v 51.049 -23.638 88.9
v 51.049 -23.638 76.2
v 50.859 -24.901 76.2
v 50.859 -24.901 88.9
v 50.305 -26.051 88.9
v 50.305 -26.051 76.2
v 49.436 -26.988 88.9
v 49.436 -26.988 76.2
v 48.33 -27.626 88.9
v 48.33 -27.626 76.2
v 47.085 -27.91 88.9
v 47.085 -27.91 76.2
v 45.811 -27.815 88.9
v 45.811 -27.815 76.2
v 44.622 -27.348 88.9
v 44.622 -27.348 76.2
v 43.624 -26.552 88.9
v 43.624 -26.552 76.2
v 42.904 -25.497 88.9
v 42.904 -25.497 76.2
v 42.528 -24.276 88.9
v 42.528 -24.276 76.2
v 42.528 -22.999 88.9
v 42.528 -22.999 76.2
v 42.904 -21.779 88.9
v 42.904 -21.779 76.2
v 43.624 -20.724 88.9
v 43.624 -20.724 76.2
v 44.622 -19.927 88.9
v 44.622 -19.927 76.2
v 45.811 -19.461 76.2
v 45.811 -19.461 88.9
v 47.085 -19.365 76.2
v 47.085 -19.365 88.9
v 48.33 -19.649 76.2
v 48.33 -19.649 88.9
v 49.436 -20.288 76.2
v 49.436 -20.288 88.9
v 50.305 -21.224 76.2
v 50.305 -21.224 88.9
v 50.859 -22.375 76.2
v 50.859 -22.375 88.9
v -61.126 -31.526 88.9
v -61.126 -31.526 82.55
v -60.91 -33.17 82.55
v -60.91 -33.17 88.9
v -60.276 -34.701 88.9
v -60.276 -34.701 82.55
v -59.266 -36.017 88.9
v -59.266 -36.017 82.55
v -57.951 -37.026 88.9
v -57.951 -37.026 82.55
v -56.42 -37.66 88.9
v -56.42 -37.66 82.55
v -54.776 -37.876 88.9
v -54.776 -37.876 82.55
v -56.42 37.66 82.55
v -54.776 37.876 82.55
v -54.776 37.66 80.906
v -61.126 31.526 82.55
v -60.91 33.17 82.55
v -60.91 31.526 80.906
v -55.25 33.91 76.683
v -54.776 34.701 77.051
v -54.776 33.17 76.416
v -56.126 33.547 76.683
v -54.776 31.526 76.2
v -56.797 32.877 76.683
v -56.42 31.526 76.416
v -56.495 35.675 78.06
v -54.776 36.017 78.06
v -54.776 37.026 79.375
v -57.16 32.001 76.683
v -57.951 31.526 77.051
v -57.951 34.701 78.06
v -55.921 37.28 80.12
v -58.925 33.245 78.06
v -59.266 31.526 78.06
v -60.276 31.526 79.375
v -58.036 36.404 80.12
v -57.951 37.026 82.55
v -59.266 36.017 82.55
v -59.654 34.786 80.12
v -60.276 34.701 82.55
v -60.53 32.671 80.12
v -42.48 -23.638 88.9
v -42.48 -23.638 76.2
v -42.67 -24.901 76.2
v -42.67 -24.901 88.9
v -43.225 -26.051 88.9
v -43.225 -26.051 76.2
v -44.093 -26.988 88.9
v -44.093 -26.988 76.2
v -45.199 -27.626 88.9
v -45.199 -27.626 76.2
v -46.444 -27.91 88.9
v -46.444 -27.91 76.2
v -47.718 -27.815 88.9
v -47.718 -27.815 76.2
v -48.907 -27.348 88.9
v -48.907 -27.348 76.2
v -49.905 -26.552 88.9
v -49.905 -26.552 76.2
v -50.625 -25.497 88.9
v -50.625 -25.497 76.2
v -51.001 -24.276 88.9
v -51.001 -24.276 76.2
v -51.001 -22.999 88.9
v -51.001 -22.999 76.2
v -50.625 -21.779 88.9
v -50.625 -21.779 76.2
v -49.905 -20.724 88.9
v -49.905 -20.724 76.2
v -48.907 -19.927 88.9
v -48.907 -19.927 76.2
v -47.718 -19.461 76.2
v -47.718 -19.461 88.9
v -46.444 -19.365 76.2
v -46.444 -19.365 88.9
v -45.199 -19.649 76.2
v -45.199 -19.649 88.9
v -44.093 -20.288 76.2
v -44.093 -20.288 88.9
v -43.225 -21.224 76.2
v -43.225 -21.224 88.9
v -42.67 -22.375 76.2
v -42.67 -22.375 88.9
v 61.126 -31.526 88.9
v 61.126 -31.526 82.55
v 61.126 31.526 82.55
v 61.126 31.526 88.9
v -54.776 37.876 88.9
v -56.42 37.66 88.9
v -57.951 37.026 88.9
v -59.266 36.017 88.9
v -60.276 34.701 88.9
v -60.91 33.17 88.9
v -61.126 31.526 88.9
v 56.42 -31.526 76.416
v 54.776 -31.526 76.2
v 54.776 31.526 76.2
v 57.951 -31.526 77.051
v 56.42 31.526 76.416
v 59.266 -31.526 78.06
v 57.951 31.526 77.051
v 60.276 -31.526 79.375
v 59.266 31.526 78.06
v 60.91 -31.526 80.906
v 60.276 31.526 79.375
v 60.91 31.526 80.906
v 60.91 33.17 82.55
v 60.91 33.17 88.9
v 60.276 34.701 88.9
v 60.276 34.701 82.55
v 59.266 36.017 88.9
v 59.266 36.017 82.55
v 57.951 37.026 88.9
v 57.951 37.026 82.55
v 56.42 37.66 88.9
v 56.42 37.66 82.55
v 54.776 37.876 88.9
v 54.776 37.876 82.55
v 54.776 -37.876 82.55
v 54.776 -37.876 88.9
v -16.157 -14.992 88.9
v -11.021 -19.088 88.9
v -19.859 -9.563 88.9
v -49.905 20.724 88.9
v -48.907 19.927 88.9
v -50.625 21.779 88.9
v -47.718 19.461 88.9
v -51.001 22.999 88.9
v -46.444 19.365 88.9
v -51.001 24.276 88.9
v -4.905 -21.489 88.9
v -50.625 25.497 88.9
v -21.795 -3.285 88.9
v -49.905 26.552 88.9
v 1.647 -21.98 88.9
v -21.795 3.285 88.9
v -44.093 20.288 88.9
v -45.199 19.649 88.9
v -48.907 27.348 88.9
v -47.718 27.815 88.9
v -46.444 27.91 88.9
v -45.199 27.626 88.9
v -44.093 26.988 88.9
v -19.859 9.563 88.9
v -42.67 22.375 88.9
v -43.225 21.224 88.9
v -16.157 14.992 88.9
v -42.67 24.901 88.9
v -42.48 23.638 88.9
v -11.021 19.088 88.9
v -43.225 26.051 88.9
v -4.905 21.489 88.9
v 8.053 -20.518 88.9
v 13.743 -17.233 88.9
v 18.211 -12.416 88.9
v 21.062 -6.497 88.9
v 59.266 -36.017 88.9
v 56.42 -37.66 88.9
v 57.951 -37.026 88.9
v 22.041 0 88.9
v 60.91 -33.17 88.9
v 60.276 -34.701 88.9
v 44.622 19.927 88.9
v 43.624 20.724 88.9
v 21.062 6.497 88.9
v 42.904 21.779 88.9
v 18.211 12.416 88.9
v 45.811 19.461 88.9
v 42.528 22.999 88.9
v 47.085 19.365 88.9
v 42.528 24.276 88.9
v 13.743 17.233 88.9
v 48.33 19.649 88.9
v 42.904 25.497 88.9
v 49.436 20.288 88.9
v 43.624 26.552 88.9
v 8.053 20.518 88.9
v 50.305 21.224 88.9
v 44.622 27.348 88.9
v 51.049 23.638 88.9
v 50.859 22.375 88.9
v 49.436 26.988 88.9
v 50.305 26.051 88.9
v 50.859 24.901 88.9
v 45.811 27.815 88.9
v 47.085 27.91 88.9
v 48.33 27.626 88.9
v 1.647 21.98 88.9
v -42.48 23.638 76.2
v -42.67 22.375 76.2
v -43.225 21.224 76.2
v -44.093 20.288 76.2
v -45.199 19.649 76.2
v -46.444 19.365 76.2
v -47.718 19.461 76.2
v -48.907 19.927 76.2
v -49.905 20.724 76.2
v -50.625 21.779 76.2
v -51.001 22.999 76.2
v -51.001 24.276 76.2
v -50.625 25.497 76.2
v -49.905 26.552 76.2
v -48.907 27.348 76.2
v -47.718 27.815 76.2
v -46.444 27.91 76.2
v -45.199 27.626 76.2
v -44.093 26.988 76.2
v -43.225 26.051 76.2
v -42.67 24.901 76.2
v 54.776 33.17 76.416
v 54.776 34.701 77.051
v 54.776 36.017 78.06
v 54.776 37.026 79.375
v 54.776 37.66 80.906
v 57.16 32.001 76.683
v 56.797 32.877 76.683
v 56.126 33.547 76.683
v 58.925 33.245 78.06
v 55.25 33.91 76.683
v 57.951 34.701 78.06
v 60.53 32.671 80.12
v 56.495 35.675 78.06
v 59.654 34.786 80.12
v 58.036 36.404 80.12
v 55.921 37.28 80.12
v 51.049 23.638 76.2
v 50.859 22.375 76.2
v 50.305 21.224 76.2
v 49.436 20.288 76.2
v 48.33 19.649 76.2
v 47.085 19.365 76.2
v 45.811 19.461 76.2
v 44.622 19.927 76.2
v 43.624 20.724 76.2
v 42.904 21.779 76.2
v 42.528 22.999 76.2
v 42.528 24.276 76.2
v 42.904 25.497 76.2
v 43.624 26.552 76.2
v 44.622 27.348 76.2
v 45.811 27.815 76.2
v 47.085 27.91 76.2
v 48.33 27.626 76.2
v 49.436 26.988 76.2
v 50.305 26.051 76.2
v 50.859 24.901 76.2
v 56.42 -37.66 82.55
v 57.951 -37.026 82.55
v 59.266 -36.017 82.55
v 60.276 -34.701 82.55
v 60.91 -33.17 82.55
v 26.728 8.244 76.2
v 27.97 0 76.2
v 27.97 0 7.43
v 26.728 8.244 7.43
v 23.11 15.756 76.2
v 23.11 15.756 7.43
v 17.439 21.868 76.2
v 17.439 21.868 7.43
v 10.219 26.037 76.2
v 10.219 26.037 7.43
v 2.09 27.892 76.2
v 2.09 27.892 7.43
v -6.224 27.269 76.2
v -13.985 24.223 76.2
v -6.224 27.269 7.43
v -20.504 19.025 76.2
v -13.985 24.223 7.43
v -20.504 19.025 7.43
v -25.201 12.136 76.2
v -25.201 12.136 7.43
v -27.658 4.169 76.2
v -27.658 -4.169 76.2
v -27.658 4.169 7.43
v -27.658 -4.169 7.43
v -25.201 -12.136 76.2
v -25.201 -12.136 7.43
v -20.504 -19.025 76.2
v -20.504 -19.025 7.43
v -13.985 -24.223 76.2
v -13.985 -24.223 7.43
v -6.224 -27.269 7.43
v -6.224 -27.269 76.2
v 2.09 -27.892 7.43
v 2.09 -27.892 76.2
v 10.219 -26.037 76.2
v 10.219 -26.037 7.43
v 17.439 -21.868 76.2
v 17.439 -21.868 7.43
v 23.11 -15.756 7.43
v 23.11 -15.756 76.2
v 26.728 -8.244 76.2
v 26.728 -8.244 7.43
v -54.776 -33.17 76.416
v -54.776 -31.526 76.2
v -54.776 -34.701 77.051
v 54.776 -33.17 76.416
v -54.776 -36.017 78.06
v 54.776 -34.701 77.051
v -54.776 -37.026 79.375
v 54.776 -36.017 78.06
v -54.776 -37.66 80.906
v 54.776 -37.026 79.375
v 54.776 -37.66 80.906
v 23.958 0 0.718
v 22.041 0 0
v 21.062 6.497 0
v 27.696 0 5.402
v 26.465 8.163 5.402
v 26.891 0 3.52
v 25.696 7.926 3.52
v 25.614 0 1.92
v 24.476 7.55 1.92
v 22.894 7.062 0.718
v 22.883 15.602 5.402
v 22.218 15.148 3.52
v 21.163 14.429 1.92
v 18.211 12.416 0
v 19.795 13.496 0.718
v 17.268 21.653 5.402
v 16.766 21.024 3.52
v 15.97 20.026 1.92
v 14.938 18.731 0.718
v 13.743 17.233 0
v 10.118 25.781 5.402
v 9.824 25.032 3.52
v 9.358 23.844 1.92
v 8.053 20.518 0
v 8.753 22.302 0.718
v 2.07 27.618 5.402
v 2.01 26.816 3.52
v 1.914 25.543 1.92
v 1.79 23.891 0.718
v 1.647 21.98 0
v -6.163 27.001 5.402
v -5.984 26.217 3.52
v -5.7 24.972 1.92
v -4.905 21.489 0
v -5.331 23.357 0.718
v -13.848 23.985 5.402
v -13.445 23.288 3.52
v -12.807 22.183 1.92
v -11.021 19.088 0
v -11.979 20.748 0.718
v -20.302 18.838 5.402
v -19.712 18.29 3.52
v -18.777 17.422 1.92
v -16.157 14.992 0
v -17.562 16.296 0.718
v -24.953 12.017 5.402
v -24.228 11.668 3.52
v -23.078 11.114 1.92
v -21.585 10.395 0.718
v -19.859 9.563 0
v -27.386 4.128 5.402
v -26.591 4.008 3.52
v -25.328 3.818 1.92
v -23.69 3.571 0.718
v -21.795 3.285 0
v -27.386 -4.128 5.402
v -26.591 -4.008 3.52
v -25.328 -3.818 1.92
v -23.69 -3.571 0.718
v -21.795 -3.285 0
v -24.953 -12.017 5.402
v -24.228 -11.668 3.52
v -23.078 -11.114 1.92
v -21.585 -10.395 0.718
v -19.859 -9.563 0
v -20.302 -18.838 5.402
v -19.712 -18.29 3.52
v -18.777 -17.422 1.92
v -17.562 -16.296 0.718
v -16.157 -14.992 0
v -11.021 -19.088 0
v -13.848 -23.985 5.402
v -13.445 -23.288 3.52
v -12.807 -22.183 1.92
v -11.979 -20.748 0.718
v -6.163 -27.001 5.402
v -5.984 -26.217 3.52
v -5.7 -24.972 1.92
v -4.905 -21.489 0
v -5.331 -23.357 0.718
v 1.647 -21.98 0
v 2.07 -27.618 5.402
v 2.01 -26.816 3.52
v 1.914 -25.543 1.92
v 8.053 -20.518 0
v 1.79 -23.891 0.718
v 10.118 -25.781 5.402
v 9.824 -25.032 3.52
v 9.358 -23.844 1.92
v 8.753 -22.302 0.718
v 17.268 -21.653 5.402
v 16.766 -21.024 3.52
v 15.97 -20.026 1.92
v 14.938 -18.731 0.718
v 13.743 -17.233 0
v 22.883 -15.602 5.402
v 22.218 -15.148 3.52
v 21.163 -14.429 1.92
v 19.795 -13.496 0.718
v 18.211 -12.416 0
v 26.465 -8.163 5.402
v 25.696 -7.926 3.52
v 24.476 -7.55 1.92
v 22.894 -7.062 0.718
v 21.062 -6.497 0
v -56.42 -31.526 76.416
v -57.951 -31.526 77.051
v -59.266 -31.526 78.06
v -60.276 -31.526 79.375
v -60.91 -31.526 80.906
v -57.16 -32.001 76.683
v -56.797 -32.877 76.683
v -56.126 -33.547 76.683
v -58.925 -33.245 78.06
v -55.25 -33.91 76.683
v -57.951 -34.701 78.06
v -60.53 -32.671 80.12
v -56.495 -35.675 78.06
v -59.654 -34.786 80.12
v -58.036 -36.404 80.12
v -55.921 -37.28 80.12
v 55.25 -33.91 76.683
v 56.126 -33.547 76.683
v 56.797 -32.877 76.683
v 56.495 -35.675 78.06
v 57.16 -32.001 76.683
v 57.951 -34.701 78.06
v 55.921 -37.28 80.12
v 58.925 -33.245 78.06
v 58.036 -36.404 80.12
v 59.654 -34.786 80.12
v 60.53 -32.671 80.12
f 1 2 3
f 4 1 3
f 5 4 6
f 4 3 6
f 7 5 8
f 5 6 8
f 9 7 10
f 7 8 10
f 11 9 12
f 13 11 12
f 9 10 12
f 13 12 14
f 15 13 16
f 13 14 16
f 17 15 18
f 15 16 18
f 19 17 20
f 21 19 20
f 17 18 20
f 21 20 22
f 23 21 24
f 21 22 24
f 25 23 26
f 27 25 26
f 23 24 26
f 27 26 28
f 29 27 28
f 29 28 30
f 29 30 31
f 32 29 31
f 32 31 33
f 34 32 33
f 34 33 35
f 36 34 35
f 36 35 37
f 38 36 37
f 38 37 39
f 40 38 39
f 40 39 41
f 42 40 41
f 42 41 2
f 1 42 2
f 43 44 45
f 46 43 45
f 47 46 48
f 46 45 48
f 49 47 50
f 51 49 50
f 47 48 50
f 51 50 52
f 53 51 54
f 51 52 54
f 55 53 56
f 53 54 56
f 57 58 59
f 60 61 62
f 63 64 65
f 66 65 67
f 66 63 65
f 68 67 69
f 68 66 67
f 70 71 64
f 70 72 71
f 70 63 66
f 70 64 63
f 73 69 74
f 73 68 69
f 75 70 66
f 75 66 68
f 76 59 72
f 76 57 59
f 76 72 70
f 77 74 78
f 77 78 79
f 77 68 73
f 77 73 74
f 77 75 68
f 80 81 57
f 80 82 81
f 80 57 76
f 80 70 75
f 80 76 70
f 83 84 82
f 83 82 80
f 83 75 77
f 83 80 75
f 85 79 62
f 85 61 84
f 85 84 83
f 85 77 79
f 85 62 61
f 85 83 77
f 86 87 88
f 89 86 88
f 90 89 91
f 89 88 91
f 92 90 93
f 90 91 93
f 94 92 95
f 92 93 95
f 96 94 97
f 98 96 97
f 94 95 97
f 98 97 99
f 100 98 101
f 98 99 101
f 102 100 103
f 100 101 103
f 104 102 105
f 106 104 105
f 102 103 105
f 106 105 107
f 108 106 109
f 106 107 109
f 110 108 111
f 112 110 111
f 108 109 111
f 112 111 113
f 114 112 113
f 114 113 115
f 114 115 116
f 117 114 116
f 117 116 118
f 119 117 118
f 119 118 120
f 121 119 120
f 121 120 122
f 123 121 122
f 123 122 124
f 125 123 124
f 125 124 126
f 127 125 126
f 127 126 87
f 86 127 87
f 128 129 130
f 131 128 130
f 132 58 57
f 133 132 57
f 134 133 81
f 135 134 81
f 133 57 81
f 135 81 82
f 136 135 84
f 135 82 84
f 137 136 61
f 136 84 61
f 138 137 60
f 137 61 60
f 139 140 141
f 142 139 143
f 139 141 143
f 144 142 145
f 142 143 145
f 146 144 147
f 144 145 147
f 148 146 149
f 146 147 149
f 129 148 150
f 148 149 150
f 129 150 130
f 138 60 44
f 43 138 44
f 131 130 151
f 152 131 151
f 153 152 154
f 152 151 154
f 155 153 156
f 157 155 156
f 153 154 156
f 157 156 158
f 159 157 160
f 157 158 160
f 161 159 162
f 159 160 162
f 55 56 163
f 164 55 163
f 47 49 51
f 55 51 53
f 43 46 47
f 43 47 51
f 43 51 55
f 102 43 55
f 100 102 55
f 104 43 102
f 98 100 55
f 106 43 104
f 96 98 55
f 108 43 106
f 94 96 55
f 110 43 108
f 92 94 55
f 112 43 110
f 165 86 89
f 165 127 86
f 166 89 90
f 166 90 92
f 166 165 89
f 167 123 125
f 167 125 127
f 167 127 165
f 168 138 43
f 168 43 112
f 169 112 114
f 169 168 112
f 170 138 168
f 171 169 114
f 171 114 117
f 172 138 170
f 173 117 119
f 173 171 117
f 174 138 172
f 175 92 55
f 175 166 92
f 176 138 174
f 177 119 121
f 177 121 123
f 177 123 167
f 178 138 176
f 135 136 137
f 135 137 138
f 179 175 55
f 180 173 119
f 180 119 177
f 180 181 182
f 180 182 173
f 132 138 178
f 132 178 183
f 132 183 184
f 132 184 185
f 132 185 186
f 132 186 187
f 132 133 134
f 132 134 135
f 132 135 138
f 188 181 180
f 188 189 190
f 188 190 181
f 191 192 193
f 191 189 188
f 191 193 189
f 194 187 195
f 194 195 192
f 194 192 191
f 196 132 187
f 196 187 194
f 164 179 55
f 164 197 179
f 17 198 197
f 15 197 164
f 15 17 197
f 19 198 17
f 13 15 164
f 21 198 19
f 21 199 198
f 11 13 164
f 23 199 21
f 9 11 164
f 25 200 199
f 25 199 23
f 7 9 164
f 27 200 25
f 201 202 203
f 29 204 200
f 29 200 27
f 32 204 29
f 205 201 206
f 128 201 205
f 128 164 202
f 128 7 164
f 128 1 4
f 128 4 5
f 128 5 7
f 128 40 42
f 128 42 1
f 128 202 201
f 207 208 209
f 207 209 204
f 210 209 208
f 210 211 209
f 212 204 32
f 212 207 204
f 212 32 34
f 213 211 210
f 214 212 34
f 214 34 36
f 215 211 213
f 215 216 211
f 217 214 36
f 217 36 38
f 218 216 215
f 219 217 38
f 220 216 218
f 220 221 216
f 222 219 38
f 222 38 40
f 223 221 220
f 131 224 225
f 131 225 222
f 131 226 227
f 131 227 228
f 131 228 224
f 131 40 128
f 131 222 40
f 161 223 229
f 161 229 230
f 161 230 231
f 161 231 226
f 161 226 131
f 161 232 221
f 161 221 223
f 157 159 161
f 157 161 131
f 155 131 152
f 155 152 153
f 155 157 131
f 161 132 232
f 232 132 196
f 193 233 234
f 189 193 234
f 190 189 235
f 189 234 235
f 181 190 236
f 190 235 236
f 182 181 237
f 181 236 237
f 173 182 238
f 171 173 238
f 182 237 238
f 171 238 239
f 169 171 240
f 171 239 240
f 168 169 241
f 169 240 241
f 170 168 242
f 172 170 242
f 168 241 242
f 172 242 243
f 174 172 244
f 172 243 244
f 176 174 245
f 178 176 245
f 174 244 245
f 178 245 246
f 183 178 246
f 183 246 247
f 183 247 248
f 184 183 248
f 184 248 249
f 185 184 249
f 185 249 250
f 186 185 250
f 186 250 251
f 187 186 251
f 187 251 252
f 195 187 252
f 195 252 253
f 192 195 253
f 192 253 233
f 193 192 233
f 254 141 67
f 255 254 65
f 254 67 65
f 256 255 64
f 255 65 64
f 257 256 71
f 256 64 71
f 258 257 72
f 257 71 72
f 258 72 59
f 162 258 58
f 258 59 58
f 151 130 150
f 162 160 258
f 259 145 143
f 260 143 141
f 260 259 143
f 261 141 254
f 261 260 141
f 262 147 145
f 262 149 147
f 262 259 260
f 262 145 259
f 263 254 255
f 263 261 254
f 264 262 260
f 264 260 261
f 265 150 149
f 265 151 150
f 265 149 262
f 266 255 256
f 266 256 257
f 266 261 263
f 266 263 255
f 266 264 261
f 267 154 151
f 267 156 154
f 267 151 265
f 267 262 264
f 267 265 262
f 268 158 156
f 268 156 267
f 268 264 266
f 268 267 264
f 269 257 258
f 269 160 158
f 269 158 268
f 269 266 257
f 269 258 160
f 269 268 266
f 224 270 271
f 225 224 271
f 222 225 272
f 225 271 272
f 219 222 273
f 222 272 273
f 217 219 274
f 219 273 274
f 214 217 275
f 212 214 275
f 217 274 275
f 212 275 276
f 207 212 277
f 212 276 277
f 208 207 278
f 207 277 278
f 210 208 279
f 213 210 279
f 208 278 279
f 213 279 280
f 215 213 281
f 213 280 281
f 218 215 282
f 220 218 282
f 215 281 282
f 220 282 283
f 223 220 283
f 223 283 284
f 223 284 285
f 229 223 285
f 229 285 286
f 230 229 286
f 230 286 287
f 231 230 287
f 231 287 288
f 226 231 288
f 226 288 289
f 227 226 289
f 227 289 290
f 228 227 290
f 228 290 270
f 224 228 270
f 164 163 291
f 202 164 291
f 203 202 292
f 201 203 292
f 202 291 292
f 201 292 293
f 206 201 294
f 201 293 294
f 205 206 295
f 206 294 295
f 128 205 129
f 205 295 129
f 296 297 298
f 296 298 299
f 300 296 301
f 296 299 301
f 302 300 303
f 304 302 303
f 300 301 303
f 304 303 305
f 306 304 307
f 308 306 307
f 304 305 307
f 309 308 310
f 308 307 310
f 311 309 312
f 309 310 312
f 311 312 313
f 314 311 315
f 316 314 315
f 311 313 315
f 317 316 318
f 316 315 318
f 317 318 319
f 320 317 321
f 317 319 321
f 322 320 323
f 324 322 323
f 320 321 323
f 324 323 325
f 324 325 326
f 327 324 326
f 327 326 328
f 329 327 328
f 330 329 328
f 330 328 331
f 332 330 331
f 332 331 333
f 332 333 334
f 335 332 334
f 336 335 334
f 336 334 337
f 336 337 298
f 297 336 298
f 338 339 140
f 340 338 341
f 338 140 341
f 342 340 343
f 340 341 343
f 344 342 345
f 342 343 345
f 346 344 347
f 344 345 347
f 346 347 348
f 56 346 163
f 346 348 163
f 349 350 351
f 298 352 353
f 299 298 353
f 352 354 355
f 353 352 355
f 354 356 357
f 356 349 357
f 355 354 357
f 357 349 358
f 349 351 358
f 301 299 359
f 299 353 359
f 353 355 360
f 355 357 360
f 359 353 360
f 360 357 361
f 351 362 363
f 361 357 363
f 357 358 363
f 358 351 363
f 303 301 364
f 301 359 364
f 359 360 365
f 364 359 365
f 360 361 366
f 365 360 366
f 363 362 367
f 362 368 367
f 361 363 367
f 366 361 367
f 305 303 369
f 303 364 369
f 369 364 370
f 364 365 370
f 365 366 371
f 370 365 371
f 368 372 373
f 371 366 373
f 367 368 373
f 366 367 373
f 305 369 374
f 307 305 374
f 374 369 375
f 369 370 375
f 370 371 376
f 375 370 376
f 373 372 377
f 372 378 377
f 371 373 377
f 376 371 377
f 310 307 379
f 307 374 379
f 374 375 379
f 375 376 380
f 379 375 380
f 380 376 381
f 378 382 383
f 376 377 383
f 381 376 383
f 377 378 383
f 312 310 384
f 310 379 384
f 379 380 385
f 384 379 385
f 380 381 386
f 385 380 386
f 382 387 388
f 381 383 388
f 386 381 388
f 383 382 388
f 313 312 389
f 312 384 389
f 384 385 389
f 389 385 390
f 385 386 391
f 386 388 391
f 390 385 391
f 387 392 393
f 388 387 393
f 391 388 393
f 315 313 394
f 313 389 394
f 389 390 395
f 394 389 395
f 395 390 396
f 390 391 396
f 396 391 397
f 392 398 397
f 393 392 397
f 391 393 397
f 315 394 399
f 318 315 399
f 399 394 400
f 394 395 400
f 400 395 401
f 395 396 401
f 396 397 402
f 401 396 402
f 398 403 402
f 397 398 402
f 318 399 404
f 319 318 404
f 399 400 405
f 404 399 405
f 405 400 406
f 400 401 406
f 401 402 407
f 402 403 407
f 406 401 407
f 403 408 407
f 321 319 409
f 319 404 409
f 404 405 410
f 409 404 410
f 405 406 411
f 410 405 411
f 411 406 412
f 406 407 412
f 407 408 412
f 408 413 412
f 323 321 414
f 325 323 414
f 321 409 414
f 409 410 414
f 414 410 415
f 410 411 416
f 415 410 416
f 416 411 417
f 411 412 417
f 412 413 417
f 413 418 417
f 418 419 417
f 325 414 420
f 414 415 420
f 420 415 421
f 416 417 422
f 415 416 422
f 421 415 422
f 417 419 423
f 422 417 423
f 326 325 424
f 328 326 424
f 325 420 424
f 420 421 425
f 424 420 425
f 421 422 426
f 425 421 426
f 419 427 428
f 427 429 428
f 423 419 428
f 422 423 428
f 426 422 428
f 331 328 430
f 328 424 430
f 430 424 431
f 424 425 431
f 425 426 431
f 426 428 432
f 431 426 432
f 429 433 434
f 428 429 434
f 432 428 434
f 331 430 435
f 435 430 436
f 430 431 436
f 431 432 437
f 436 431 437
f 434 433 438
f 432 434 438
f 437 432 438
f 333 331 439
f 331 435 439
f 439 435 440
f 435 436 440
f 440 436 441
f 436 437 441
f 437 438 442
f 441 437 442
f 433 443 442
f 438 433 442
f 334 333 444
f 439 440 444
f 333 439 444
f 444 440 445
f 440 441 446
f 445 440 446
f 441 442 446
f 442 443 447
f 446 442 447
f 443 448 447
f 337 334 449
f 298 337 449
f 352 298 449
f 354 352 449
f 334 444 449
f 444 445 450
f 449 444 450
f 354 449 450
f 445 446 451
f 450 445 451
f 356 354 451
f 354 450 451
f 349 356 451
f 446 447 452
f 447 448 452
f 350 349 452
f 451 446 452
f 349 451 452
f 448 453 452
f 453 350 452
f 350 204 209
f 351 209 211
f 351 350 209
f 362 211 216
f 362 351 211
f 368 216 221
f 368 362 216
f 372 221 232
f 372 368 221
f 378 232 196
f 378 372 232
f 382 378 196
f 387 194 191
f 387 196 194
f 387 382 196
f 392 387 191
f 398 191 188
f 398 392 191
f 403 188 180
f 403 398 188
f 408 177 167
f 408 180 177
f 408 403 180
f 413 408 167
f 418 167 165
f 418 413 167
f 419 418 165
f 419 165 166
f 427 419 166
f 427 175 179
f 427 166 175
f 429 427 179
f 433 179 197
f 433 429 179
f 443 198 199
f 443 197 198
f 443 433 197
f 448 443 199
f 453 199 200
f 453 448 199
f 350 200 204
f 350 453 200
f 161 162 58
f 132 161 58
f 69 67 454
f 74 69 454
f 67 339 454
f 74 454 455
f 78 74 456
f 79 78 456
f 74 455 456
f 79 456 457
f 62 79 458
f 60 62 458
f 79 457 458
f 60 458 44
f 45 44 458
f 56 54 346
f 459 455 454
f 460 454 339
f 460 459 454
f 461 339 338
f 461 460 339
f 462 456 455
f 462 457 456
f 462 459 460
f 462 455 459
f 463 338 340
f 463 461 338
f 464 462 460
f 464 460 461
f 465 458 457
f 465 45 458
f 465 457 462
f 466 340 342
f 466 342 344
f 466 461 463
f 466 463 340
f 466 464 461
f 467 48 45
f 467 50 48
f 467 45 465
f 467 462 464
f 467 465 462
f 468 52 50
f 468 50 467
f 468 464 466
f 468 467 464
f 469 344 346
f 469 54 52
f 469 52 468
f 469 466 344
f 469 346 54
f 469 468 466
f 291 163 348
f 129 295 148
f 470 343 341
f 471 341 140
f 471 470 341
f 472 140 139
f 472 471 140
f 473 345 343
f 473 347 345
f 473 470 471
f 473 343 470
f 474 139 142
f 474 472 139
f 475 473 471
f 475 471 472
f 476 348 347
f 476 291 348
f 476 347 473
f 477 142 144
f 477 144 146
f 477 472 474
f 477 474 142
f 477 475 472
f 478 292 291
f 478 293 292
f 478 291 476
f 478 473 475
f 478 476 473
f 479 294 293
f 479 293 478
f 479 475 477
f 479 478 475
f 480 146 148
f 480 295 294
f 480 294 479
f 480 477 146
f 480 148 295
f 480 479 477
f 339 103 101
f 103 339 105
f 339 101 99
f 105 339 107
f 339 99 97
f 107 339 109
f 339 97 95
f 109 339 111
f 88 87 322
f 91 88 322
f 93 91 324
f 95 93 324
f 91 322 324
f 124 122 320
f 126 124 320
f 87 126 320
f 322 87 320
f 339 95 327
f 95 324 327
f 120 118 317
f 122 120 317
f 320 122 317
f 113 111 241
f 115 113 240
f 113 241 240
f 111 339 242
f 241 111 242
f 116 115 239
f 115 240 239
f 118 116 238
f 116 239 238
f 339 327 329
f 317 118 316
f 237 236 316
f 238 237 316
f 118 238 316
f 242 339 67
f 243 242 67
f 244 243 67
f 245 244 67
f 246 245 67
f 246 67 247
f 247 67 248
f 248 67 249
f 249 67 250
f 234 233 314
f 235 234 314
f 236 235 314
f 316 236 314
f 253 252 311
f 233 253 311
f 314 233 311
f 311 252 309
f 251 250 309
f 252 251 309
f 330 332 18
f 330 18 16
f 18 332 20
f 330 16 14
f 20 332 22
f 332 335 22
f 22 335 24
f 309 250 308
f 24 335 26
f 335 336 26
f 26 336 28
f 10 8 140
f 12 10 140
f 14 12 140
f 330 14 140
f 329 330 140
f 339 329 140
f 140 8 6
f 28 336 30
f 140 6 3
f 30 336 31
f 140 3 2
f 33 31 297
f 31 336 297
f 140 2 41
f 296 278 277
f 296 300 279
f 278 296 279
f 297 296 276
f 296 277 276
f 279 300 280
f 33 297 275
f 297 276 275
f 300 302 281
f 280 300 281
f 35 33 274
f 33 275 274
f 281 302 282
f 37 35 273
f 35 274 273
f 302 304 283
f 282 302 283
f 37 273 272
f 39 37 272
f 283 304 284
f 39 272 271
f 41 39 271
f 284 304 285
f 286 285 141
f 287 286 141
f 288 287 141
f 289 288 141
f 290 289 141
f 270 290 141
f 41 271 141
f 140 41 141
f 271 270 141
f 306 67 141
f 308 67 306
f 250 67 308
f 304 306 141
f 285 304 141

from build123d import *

# Parameters (mm, degrees)
F0_R     = 27.9704951592
F0_R_2   = 22.0413133634
F1_DEPTH = 76.2
F3_DEPTH = 12.7
F5_R     = 6.35
F6_R     = 4.2845599963
F7_DEPTH = 25.4
F8_DEPTH = 25.4


# Not quite as in the source:
# - a fillet or chamfer that OpenCascade refuses, or shapes differently, is made with other operations: its cross-section is extruded or revolved along the edge and cut away or added


with BuildPart() as f1:
    # F0 (on Top) → F1 (new body)
    with BuildSketch(Plane.XY):
        Circle(F0_R)
        Circle(F0_R_2, mode=Mode.SUBTRACT)
    extrude(amount=F1_DEPTH)

    # F2 (on face) → F3 (join)
    with BuildSketch(Plane.XY.offset(76.2)):
        with BuildLine():
            Line((-54.7763327301, -37.8764942288), (54.7763327301, -37.8764942288))
            ThreePointArc((54.7763327301, -37.8764942288), (59.2664607906, -36.0166222894), (61.1263327301, -31.5264942288))
            Line((61.1263327301, -31.5264942288), (61.1263327301, 31.5264942288))
            ThreePointArc((61.1263327301, 31.5264942288), (59.2664607906, 36.0166222894), (54.7763327301, 37.8764942288))
            Line((54.7763327301, 37.8764942288), (-54.7763327301, 37.8764942288))
            ThreePointArc((-54.7763327301, 37.8764942288), (-59.2664607906, 36.0166222894), (-61.1263327301, 31.5264942288))
            Line((-61.1263327301, 31.5264942288), (-61.1263327301, -31.5264942288))
            ThreePointArc((-61.1263327301, -31.5264942288), (-59.2664607906, -36.0166222894), (-54.7763327301, -37.8764942288))
        make_face()
    extrude(amount=F3_DEPTH)

    # F4: fillet of radius 7.62 on 1 edges, made by hand

    # F4_s1 → F4_t2 (revolve, cut)
    with BuildSketch(Plane.XZ):
        with BuildLine():
            ThreePointArc((27.9704951592, 7.4300426513), (26.3065187789, 2.6771295823), (22.0413133634, 0))
            Line((22.0413133634, 0), (27.9704951592, 0))
            Line((27.9704951592, 0), (27.9704951592, 7.4300426513))
        make_face()
    revolve(axis=Axis((0, 0, 0), (0, 0, 1)), mode=Mode.SUBTRACT)

    # F5
    f5_edges = [f1.edges().sort_by_distance(p)[0] for p in [
        (-61.126333, 0, 76.2),
        (0, -37.876494, 76.2),
        (61.126333, 0, 76.2),
        (0, 37.876494, 76.2),
        (-59.266461, -36.016622, 76.2),
        (59.266461, -36.016622, 76.2),
        (-59.266461, 36.016622, 76.2),
        (59.266461, 36.016622, 76.2),
    ]]
    fillet(f5_edges, radius=F5_R)

    # F6 (on face) → F7 (cut)
    with BuildSketch(Plane(origin=(0, 0, 76.2), x_dir=(1, 0, 0), z_dir=(0, 0, -1))):
        with Locations((46.7646792531, -23.6378517002)):
            Circle(F6_R)
        with Locations((-46.7646792531, -23.6378517002)):
            Circle(F6_R)
        with Locations((46.7646792531, 23.6378517002)):
            Circle(F6_R)
        with Locations((-46.7646792531, 23.6378517002)):
            Circle(F6_R)
    extrude(amount=-F7_DEPTH, mode=Mode.SUBTRACT)

    # F8 (cut): a face of the model
    f8_faces = [f1.faces().sort_by_distance(p)[0] for p in [
        (0, 0, 76.2),
    ]]
    extrude(f8_faces, amount=-F8_DEPTH, mode=Mode.SUBTRACT)


solid = f1.part
